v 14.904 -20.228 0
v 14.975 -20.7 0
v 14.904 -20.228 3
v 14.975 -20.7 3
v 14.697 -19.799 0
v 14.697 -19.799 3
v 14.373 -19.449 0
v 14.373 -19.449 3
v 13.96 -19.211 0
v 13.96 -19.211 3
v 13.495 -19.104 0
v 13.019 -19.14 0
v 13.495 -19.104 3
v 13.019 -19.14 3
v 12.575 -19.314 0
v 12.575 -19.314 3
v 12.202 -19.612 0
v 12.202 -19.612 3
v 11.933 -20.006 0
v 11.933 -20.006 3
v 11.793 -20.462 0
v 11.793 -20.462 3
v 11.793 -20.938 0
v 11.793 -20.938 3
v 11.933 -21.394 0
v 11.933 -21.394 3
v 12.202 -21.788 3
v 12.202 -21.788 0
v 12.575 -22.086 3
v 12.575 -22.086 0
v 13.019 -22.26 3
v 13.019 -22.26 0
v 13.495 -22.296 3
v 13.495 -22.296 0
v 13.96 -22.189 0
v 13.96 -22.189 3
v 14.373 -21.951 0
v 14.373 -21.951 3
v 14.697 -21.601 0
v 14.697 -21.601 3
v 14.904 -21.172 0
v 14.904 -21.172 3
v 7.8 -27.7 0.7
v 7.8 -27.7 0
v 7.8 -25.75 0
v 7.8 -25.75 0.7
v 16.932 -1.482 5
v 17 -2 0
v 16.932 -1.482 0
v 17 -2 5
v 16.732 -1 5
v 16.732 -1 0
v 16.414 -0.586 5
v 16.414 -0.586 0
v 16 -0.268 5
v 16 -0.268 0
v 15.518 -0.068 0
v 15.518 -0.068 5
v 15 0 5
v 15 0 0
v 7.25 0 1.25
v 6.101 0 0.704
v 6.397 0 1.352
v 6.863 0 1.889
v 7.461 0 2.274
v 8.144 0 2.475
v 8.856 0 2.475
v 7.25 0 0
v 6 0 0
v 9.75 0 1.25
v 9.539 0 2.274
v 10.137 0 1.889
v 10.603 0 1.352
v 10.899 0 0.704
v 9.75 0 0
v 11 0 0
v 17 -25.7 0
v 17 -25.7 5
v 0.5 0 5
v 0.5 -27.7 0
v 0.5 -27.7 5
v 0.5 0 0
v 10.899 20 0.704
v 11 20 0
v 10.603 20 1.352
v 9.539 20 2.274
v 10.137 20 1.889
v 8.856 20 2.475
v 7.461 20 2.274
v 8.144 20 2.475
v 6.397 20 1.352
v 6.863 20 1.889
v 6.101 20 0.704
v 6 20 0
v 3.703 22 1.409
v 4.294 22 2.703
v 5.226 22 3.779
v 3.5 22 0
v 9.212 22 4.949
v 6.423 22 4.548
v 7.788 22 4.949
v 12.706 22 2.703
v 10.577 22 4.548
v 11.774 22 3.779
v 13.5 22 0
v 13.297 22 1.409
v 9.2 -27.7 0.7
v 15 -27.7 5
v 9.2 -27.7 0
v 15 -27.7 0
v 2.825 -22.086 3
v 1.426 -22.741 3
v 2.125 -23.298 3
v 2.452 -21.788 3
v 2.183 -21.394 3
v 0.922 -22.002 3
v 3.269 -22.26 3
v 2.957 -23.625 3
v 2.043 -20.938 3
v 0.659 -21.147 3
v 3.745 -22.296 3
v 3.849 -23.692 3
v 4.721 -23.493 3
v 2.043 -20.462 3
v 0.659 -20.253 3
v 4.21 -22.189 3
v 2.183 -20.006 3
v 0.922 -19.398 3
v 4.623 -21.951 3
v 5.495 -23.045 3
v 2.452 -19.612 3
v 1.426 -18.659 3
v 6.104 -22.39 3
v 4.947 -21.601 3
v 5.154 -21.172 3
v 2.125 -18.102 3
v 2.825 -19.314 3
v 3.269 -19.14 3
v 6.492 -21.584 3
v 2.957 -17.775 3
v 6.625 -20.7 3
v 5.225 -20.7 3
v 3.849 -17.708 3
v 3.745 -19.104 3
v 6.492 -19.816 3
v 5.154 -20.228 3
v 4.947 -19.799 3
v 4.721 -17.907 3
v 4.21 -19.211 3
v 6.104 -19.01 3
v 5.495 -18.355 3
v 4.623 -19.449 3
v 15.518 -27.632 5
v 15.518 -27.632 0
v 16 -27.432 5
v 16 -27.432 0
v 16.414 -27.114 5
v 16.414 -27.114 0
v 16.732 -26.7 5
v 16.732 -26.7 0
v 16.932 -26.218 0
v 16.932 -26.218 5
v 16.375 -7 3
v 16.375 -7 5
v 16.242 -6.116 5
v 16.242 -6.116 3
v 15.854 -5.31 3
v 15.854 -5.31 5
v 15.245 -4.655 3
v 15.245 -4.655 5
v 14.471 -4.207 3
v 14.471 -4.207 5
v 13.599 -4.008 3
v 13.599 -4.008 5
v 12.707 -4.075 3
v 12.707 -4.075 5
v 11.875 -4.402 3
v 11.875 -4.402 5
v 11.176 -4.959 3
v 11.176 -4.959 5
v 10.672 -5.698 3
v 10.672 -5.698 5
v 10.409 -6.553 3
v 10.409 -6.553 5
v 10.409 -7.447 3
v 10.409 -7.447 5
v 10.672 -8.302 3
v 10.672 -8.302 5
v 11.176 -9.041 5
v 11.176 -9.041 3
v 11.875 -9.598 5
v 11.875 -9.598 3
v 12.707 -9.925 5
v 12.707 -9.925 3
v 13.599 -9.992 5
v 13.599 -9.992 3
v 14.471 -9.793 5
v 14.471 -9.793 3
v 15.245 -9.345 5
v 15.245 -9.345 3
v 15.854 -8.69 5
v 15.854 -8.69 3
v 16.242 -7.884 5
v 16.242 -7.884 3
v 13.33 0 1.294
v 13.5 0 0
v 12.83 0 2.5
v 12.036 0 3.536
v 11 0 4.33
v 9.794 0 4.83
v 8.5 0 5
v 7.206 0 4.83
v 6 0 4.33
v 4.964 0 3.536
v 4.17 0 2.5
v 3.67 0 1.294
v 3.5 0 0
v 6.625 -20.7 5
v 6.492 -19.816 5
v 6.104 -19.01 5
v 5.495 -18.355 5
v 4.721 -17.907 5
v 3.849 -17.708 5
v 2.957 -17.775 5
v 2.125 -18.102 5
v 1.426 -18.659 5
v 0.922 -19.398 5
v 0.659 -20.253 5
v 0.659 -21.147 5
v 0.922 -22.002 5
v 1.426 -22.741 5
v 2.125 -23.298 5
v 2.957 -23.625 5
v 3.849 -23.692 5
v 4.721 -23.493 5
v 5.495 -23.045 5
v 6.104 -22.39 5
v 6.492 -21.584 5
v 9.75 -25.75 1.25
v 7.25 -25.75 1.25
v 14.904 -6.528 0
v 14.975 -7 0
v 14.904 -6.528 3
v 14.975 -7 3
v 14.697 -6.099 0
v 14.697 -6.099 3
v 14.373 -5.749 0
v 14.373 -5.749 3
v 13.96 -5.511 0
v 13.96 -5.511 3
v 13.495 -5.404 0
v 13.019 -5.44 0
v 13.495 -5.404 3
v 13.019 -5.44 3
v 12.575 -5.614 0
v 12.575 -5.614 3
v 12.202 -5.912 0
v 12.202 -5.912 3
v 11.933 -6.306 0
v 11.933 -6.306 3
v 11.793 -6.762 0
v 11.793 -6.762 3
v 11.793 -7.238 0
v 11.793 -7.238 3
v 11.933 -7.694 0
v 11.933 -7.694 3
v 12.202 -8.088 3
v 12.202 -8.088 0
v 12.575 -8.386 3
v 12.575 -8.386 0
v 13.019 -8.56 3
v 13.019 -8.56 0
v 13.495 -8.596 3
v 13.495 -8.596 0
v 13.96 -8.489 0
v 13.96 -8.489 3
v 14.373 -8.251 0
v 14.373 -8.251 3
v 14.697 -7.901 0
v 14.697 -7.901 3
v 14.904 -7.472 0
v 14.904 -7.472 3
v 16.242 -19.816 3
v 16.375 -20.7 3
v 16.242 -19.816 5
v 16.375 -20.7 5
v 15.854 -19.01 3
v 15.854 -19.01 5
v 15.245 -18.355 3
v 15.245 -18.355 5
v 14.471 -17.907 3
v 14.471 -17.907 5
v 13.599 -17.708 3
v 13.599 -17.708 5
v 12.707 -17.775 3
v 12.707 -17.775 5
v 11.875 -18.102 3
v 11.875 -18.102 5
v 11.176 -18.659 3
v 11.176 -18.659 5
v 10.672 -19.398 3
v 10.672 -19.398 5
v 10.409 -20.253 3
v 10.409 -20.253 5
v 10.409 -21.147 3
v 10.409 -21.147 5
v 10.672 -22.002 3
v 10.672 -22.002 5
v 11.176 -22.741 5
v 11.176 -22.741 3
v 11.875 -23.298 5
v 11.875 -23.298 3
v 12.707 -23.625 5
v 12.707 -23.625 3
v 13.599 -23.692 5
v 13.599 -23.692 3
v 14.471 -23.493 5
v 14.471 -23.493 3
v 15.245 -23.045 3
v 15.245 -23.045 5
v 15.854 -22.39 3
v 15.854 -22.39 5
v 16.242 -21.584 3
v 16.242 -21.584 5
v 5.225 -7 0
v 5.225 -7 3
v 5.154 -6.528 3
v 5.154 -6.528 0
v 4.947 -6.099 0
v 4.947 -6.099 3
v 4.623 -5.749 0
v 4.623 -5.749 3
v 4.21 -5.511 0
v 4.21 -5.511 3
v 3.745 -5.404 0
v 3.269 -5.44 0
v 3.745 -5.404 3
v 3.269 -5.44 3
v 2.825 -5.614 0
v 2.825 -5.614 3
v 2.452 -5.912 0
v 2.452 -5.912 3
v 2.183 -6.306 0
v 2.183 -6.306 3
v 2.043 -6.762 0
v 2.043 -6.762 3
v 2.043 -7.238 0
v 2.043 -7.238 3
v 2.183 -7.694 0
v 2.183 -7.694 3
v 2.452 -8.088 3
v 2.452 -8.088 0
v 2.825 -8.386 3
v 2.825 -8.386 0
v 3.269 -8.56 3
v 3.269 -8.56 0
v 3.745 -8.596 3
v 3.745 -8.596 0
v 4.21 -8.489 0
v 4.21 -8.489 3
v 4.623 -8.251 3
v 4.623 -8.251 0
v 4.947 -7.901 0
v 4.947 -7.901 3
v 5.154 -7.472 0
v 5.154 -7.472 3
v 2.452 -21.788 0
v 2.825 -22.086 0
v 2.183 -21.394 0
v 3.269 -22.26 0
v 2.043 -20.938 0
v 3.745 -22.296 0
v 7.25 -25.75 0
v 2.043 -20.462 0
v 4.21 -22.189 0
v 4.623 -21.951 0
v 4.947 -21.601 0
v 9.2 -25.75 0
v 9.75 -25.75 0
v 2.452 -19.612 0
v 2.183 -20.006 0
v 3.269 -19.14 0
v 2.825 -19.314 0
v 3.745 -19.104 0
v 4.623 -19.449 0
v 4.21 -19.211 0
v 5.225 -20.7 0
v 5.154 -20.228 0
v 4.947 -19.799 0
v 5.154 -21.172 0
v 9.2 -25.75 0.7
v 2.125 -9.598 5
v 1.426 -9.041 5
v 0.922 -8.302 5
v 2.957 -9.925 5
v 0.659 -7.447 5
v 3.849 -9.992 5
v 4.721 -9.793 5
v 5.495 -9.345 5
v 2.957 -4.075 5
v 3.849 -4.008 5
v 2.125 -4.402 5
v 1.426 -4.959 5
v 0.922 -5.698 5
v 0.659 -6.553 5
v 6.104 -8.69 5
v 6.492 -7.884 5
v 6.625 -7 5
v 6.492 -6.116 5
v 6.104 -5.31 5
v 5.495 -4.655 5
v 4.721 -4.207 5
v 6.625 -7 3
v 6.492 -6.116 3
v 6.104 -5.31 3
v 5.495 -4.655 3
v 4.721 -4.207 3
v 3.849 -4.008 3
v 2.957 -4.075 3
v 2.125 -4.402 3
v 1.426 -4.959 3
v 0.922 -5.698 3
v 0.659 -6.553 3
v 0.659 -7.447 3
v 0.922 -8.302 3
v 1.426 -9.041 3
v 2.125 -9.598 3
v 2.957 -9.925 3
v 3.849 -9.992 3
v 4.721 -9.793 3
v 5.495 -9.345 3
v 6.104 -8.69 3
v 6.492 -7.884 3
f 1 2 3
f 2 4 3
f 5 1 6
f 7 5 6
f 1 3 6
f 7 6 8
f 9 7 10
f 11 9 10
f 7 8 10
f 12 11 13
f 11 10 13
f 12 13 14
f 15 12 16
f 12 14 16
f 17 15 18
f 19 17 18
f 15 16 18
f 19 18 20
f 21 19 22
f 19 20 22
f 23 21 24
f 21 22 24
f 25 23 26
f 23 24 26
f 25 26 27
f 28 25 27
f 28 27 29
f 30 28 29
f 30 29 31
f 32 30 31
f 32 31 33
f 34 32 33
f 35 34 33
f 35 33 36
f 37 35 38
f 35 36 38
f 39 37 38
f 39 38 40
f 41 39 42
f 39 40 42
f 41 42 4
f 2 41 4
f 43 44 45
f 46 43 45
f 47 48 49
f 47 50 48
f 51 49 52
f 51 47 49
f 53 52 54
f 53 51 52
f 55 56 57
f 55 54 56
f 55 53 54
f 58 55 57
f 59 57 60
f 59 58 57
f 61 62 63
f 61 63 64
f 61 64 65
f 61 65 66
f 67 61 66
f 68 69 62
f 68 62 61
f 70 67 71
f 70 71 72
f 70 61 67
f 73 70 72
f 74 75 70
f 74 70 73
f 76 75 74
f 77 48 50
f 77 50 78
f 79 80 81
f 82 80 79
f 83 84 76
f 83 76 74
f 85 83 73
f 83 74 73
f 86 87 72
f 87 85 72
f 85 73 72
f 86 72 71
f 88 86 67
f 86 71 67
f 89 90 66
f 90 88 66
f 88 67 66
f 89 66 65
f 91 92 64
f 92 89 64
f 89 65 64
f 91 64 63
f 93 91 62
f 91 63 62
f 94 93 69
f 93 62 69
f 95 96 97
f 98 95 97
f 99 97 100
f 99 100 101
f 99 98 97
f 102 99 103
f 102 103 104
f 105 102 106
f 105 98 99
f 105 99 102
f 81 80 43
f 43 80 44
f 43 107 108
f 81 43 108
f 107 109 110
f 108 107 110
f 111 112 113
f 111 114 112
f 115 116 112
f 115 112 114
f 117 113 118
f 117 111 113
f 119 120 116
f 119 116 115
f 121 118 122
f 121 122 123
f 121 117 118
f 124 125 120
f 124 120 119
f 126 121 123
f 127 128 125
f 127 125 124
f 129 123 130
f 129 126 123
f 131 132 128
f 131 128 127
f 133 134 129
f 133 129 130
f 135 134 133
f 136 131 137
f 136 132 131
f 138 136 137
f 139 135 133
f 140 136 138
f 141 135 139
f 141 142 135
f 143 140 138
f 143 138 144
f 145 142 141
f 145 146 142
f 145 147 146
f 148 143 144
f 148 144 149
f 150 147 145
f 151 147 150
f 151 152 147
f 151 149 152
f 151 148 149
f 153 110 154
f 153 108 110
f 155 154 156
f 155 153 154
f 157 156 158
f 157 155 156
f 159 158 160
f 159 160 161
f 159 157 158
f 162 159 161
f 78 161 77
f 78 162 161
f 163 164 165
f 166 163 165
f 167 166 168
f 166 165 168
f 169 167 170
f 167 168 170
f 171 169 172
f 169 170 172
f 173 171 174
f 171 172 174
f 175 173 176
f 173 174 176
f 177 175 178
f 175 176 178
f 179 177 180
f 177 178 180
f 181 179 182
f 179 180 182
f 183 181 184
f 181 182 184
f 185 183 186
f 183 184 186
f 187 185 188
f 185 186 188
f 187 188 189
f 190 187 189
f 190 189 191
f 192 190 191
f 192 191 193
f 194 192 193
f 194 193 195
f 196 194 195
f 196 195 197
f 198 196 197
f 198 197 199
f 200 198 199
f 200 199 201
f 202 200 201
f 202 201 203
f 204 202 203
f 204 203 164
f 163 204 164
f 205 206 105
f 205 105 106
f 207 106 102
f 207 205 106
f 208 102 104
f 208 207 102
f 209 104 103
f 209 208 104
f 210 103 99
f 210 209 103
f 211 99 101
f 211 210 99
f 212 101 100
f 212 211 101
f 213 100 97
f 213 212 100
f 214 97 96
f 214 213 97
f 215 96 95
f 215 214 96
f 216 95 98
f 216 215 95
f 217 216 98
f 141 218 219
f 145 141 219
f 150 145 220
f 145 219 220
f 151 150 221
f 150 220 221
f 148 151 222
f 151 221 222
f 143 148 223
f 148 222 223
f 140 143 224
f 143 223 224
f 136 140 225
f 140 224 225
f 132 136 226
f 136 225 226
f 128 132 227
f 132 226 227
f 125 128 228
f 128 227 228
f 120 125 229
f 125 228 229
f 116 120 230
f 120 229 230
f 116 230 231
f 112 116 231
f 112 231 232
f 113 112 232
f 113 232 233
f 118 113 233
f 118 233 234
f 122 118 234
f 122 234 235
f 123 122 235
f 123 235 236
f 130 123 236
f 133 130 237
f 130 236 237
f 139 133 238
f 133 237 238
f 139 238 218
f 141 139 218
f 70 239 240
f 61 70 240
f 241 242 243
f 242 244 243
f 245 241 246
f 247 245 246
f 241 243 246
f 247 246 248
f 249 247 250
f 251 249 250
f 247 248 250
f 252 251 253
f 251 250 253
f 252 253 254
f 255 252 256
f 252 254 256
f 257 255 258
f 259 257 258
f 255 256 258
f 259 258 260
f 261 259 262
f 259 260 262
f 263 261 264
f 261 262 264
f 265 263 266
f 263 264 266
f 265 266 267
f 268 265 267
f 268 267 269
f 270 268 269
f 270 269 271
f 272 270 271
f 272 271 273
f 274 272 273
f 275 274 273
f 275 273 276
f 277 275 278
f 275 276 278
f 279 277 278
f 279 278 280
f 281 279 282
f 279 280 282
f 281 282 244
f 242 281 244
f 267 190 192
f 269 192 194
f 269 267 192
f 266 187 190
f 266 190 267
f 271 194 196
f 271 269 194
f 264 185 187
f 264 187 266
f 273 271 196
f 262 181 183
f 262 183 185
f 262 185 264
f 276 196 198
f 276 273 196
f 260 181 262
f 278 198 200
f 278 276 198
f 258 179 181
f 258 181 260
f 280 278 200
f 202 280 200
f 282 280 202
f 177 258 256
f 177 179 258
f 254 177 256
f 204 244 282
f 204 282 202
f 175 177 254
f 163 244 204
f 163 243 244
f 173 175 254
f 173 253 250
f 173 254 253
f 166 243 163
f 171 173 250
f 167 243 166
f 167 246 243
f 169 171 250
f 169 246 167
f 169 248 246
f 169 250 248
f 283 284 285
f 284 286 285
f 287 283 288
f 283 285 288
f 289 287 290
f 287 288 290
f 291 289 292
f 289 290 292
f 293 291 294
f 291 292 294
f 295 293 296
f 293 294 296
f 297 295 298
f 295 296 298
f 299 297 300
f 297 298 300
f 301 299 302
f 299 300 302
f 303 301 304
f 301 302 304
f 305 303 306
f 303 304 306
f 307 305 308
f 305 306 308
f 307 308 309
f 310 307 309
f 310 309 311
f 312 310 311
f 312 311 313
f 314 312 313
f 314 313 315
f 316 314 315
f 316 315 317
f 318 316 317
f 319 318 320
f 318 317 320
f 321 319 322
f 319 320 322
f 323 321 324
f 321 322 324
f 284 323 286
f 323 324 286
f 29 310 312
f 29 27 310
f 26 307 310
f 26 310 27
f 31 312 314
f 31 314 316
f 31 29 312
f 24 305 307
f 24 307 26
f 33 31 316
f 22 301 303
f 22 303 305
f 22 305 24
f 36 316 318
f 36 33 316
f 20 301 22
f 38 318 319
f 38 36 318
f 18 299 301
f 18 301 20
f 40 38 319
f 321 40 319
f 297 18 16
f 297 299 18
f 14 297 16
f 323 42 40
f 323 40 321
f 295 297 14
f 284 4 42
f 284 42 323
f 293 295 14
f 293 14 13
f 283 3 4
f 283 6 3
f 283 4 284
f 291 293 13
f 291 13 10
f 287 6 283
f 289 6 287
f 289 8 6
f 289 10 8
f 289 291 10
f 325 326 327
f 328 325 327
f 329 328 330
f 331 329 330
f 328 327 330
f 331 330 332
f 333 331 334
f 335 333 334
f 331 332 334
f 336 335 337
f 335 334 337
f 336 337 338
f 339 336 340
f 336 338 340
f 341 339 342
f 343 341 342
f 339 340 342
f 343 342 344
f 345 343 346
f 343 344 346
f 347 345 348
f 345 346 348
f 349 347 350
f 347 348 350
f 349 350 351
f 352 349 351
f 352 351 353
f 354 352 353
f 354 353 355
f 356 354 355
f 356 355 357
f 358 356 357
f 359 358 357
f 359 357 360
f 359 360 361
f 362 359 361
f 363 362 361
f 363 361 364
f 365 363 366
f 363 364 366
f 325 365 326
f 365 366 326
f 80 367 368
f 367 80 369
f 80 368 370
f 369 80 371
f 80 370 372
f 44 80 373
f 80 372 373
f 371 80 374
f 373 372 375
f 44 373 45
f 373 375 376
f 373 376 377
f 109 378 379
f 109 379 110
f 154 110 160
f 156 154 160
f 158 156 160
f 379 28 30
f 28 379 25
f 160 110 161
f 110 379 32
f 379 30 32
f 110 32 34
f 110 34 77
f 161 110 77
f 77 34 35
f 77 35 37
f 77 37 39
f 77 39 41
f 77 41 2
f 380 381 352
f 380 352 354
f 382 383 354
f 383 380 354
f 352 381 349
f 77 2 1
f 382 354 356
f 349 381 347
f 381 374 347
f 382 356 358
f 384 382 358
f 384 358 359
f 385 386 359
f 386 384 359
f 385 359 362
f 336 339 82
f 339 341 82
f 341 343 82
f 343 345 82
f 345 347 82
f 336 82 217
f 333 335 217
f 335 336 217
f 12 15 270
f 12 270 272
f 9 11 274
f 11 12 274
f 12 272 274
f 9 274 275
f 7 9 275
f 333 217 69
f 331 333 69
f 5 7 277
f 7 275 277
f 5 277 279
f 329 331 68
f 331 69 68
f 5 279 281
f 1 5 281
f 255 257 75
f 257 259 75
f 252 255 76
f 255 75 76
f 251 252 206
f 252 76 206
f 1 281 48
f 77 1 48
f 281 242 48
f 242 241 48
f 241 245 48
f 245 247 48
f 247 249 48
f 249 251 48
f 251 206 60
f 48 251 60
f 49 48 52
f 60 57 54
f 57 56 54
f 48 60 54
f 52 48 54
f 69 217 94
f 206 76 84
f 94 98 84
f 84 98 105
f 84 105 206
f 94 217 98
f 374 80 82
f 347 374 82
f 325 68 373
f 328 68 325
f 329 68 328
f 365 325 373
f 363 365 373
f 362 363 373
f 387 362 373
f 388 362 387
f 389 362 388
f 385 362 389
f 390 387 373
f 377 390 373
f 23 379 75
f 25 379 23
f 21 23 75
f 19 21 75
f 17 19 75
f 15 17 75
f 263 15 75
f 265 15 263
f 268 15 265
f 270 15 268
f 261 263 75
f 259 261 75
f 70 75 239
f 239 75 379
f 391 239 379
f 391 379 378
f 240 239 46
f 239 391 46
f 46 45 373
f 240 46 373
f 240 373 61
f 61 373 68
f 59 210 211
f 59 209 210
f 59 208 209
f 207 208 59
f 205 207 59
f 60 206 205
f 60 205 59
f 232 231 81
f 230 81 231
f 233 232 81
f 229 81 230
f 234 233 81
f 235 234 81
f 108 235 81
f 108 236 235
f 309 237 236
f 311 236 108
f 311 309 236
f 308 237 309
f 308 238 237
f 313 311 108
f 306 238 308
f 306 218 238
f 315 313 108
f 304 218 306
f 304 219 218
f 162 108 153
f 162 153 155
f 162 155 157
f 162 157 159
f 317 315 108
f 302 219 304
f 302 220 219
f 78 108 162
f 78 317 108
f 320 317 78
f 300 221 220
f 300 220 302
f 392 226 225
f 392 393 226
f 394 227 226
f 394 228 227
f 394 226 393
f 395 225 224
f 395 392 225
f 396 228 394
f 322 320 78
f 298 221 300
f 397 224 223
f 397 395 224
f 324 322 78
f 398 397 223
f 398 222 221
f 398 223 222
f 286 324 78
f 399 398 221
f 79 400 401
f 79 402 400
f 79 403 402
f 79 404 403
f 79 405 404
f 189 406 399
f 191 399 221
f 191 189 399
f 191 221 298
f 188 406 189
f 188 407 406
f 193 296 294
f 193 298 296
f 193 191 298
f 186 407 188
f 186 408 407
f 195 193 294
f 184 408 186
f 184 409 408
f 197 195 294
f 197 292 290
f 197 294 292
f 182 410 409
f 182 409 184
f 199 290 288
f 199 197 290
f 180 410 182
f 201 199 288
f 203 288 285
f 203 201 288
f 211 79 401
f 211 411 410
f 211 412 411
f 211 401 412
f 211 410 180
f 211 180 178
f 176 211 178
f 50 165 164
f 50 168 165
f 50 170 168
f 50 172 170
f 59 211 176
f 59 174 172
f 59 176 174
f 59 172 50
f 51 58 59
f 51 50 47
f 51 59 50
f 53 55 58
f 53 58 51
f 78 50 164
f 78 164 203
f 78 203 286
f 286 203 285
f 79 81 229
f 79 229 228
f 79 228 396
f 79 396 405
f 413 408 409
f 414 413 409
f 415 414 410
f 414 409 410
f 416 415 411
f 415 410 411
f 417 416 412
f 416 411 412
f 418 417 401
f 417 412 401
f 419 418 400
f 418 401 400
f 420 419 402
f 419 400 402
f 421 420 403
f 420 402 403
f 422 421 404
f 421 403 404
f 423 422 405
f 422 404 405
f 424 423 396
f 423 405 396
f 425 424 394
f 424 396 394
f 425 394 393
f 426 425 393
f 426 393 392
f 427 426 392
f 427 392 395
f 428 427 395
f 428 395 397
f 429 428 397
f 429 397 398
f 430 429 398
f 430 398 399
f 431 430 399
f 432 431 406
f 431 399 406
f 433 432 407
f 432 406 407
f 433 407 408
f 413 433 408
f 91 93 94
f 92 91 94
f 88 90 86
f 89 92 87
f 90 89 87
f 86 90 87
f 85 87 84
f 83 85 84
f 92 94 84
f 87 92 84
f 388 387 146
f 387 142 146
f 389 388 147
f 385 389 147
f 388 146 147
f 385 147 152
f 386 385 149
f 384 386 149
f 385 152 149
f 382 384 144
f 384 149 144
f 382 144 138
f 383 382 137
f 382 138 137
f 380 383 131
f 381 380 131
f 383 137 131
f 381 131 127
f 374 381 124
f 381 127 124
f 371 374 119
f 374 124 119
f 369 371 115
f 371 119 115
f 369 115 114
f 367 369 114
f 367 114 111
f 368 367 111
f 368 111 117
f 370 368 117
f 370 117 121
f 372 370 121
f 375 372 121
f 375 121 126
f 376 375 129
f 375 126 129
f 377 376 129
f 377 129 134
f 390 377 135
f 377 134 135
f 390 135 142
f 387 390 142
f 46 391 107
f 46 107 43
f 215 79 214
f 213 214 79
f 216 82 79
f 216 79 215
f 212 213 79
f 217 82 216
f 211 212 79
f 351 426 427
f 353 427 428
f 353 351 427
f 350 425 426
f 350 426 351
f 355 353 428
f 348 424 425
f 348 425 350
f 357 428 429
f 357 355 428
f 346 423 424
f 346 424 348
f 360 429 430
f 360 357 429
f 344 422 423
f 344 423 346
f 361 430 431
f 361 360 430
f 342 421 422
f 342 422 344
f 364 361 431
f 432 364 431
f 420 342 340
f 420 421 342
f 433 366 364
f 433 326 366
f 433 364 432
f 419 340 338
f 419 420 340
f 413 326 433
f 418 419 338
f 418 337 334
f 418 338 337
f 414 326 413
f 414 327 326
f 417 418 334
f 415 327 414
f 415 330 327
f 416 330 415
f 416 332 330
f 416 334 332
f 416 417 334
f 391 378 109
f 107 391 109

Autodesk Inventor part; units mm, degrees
ref_plane "YZ Plane" through (0, 0, 0) normal (1, 0, 0) x (0, 1, 0)
ref_plane "XZ Plane" through (0, 0, 0) normal (0, 1, 0) x (-1, 0, 0)
ref_plane "XY Plane" through (0, 0, 0) normal (0, 0, 1) x (1, 0, 0)
sketch "Skizze1" plane through (0, 0, 0) normal (0, 0, 1) x (1, 0, 0)
  circle A0 centre (3.625, -20.7) radius 1.6 projected
  circle A1 centre (3.625, -7) radius 1.6 projected
  line L0 (7.8, -27.7) -> (7.8, -25.75) projected
  line L1 (7.8, -25.75) -> (7.25, -25.75) projected
  line L2 (7.25, -25.75) -> (7.25, 0) projected
  line L3 (0, 0) -> (7.25, 0) projected
  line L4 (0, -27.7) -> (0, 0) projected
  line L5 (0, -27.7) -> (7.8, -27.7) projected
  circle A2 centre (13.375, -20.7) radius 1.6 projected
  circle A3 centre (13.375, -7) radius 1.6 projected
  line L6 (9.2, -25.75) -> (9.2, -27.7) projected
  line L7 (9.2, -27.7) -> (17, -27.7) projected
  line L8 (17, 0) -> (17, -27.7) projected
  line L9 (9.75, 0) -> (17, 0) projected
  line L10 (9.75, 0) -> (9.75, -25.75) projected
  line L11 (9.75, -25.75) -> (9.2, -25.75) projected
  line L12 (0.5, 0) -> (17, 0)
  line L13 (17, 0) -> (17, -27.7)
  line L14 (17, -27.7) -> (0.5, -27.7)
  line L15 (0.5, -27.7) -> (0.5, 0)
  dimension "d0" = 0.5
extrude "Extrusion1" add sketch "Skizze1" along normal blind 5 contours A0 | A1 | L5 L15 L3 L2 L1 L0 | L0 L1 L2 L12 L10 L11 L6 L14 | L6 L11 L10 L9 L8 L7 | A2 | A3
sketch "Skizze2" plane through (0, 0, 5) normal (0, 0, 1) x (1, 0, 0)
  circle A0 centre (3.625, -7) radius 1.6 projected
  circle A1 centre (13.375, -7) radius 1.6 projected
  circle A2 centre (13.375, -20.7) radius 1.6 projected
  circle A3 centre (3.625, -20.7) radius 1.6 projected
  point P0 (0, 0)
extrude "Extrusion2" cut sketch "Skizze2" against normal blind 10
sketch "Skizze3" plane through (0, 0, 0) normal (0, 0, -1) x (-1, 0, 0)
  line L0 (-7.25, -25.75) -> (-7.25, 0) projected
  line L1 (-9.75, 0) -> (-9.75, -25.75) projected
  line L2 (-9.75, -25.75) -> (-7.25, -25.75) projected
  line L3 (-7.25, 0) -> (-9.75, 0)
  line L4 (-17, 0) -> (-0.5, 0) projected
  point P0 (0, 0)
  dimension "d5" = 2.5
extrude "Extrusion3" cut sketch "Skizze3" against normal blind 1.25
sketch "Skizze4" plane through (0, 0, 0) normal (0, 0, -1) x (-1, 0, 0)
  line L0 (-7.8, -27.7) -> (-7.8, -25.75) projected
  line L1 (-9.2, -25.75) -> (-9.2, -27.7) projected
  line L2 (-7.8, -27.7) -> (-9.2, -27.7)
  line L3 (-0.5, -27.7) -> (-17, -27.7) projected
  line L4 (-7.8, -25.75) -> (-9.2, -25.75)
  line L5 (-7.25, -25.75) -> (-9.75, -25.75) projected
  point P0 (0, 0)
  dimension "d8" = 1.4
extrude "Extrusion4" cut sketch "Skizze4" against normal blind 0.7
fillet "Rundung1" radius 2 2 edges at (17, 0, 2.5) (17, -27.7, 2.5)
sketch "Skizze5" plane through (0.5, 0, 5) normal (0, 1, 0) x (1, 0, 0)
  line L0 (0, 5) -> (7.3, 5) projected
  line L1 (8.7, 5) -> (14.5, 5) projected
  arc A0 (5.5, 5) -> (10.5, 5) centre (8, 5) ccw
  line L2 (8.7, 4.3) -> (7.3, 4.3) projected
  arc A1 (3, 5) -> (13, 5) centre (8, 5) ccw
  line L3 (13, 5) -> (10.5, 5)
  line L4 (5.5, 5) -> (3, 5)
  line L5 (14.5, 0) -> (0, 0) projected
  point P0 (-0.5, 5)
  point P1 (8, 4.3)
  dimension "d12" = 2.5
  dimension "d13" = 0
extrude "Extrusion5" add sketch "Skizze5" along normal blind 20
sketch "Skizze7" plane through (0, 0, 5) normal (0, 0, 1) x (1, 0, 0)
  circle A0 centre (3.625, -7) radius 3
  circle A1 centre (13.375, -7) radius 3
  circle A2 centre (13.375, -20.7) radius 1.6 projected
  circle A3 centre (13.375, -20.7) radius 3
  circle A4 centre (3.625, -20.7) radius 3
  circle A5 centre (3.625, -7) radius 1.6 projected
  circle A6 centre (13.375, -7) radius 1.6 projected
  circle A7 centre (3.625, -20.7) radius 1.6 projected
  point P0 (0, 0)
  dimension "d18" = 6
extrude "Extrusion7" cut sketch "Skizze7" against normal blind 2 contours A0 | A1 | A2 | A3 | A4 | A5 | A7
sketch "Skizze8" plane through (0.5, 20, 5) normal (0, 1, 0) x (1, 0, 0)
  point P0 (-0.5, 5)
sketch "Skizze9" plane through (0.5, 20, 5) normal (0, 1, 0) x (1, 0, 0)
  line L0 (13, 5) -> (10.5, 5) projected
  arc A0 (5.5, 5) -> (10.5, 5) centre (8, 5) ccw projected
  line L1 (5.5, 5) -> (3, 5) projected
  arc A1 (3, 5) -> (13, 5) centre (8, 5) ccw projected
  circle A2 centre (8, 5) radius 5
  line L2 (5.5, 5) -> (10.5, 5)
  point P0 (-0.5, 5)
  point P1 (3, 5)
  point P2 (13, 5)
extrude "Extrusion8" add sketch "Skizze9" along normal blind 2 contours A1 L1 A0 L0 | A0 L2
equation "\"d6\" = 0.5 * d5"
equation "\"d9\" = 0.5 * d8"
properties part number "NadelHalterLose"
